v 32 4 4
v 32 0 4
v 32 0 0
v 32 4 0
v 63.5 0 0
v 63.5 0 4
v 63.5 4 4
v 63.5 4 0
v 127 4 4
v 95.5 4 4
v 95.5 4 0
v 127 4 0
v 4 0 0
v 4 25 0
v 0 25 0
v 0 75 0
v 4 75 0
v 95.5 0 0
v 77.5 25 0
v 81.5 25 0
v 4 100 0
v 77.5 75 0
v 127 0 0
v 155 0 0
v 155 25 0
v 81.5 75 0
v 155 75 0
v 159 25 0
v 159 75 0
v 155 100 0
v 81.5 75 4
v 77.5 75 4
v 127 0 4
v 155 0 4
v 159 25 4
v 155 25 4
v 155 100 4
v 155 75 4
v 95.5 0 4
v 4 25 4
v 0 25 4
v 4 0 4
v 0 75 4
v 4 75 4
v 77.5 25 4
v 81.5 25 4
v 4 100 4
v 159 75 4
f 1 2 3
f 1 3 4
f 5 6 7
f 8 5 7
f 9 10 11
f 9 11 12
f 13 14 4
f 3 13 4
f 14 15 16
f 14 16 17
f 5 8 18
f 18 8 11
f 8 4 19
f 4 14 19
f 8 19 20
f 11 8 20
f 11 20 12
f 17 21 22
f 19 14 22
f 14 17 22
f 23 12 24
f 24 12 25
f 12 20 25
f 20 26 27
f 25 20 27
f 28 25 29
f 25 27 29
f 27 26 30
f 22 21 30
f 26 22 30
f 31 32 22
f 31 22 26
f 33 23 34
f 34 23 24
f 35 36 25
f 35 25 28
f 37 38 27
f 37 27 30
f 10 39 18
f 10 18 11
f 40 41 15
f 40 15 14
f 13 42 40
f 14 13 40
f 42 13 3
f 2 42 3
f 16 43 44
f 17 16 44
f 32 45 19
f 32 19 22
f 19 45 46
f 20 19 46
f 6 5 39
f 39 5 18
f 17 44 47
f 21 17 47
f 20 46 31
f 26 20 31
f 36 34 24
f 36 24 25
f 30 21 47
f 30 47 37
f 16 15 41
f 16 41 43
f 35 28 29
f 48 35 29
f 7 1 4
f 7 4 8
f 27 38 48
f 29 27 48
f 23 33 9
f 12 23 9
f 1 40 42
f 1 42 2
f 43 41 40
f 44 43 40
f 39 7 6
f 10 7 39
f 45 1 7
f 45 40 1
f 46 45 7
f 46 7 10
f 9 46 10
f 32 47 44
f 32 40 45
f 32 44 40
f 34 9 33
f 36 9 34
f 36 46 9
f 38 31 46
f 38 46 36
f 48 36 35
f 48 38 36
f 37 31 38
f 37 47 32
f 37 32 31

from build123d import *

# Parameters (mm, degrees)
F0_W     = 159
F0_H     = 100
F1_DEPTH = 4
F2_W     = 31.5
F2_H     = 4
F3_DEPTH = 4
F4_W     = 4
F4_H     = 25
F5_DEPTH = 4
F6_W     = 4
F6_H     = 50
F7_DEPTH = 4


with BuildPart() as f1:
    # F0 (on Top) → F1 (new body)
    with BuildSketch(Plane.XY):
        with Locations((79.5, 50)):
            Rectangle(F0_W, F0_H)
    extrude(amount=F1_DEPTH)

    # F2 (on face) → F3 (cut, through all)
    with BuildSketch(Plane.XY.offset(4)):
        with Locations((47.75, 2)):
            Rectangle(F2_W, F2_H)
        with Locations((111.25, 2)):
            Rectangle(F2_W, F2_H)
    extrude(amount=-F3_DEPTH, mode=Mode.SUBTRACT)

    # F4 (on face) → F5 (cut, through all)
    with BuildSketch(Plane.XY.offset(4)):
        with Locations((157, 12.5)):
            Rectangle(F4_W, F4_H)
        with Locations((157, 87.5)):
            Rectangle(F4_W, F4_H)
        with Locations((2, 87.5)):
            Rectangle(F4_W, F4_H)
        with Locations((2, 12.5)):
            Rectangle(F4_W, F4_H)
    extrude(amount=-F5_DEPTH, mode=Mode.SUBTRACT)

    # F6 (on face) → F7 (cut, through all)
    with BuildSketch(Plane.XY.offset(4)):
        with Locations((79.5, 50)):
            Rectangle(F6_W, F6_H)
    extrude(amount=-F7_DEPTH, mode=Mode.SUBTRACT)


solid = f1.part
